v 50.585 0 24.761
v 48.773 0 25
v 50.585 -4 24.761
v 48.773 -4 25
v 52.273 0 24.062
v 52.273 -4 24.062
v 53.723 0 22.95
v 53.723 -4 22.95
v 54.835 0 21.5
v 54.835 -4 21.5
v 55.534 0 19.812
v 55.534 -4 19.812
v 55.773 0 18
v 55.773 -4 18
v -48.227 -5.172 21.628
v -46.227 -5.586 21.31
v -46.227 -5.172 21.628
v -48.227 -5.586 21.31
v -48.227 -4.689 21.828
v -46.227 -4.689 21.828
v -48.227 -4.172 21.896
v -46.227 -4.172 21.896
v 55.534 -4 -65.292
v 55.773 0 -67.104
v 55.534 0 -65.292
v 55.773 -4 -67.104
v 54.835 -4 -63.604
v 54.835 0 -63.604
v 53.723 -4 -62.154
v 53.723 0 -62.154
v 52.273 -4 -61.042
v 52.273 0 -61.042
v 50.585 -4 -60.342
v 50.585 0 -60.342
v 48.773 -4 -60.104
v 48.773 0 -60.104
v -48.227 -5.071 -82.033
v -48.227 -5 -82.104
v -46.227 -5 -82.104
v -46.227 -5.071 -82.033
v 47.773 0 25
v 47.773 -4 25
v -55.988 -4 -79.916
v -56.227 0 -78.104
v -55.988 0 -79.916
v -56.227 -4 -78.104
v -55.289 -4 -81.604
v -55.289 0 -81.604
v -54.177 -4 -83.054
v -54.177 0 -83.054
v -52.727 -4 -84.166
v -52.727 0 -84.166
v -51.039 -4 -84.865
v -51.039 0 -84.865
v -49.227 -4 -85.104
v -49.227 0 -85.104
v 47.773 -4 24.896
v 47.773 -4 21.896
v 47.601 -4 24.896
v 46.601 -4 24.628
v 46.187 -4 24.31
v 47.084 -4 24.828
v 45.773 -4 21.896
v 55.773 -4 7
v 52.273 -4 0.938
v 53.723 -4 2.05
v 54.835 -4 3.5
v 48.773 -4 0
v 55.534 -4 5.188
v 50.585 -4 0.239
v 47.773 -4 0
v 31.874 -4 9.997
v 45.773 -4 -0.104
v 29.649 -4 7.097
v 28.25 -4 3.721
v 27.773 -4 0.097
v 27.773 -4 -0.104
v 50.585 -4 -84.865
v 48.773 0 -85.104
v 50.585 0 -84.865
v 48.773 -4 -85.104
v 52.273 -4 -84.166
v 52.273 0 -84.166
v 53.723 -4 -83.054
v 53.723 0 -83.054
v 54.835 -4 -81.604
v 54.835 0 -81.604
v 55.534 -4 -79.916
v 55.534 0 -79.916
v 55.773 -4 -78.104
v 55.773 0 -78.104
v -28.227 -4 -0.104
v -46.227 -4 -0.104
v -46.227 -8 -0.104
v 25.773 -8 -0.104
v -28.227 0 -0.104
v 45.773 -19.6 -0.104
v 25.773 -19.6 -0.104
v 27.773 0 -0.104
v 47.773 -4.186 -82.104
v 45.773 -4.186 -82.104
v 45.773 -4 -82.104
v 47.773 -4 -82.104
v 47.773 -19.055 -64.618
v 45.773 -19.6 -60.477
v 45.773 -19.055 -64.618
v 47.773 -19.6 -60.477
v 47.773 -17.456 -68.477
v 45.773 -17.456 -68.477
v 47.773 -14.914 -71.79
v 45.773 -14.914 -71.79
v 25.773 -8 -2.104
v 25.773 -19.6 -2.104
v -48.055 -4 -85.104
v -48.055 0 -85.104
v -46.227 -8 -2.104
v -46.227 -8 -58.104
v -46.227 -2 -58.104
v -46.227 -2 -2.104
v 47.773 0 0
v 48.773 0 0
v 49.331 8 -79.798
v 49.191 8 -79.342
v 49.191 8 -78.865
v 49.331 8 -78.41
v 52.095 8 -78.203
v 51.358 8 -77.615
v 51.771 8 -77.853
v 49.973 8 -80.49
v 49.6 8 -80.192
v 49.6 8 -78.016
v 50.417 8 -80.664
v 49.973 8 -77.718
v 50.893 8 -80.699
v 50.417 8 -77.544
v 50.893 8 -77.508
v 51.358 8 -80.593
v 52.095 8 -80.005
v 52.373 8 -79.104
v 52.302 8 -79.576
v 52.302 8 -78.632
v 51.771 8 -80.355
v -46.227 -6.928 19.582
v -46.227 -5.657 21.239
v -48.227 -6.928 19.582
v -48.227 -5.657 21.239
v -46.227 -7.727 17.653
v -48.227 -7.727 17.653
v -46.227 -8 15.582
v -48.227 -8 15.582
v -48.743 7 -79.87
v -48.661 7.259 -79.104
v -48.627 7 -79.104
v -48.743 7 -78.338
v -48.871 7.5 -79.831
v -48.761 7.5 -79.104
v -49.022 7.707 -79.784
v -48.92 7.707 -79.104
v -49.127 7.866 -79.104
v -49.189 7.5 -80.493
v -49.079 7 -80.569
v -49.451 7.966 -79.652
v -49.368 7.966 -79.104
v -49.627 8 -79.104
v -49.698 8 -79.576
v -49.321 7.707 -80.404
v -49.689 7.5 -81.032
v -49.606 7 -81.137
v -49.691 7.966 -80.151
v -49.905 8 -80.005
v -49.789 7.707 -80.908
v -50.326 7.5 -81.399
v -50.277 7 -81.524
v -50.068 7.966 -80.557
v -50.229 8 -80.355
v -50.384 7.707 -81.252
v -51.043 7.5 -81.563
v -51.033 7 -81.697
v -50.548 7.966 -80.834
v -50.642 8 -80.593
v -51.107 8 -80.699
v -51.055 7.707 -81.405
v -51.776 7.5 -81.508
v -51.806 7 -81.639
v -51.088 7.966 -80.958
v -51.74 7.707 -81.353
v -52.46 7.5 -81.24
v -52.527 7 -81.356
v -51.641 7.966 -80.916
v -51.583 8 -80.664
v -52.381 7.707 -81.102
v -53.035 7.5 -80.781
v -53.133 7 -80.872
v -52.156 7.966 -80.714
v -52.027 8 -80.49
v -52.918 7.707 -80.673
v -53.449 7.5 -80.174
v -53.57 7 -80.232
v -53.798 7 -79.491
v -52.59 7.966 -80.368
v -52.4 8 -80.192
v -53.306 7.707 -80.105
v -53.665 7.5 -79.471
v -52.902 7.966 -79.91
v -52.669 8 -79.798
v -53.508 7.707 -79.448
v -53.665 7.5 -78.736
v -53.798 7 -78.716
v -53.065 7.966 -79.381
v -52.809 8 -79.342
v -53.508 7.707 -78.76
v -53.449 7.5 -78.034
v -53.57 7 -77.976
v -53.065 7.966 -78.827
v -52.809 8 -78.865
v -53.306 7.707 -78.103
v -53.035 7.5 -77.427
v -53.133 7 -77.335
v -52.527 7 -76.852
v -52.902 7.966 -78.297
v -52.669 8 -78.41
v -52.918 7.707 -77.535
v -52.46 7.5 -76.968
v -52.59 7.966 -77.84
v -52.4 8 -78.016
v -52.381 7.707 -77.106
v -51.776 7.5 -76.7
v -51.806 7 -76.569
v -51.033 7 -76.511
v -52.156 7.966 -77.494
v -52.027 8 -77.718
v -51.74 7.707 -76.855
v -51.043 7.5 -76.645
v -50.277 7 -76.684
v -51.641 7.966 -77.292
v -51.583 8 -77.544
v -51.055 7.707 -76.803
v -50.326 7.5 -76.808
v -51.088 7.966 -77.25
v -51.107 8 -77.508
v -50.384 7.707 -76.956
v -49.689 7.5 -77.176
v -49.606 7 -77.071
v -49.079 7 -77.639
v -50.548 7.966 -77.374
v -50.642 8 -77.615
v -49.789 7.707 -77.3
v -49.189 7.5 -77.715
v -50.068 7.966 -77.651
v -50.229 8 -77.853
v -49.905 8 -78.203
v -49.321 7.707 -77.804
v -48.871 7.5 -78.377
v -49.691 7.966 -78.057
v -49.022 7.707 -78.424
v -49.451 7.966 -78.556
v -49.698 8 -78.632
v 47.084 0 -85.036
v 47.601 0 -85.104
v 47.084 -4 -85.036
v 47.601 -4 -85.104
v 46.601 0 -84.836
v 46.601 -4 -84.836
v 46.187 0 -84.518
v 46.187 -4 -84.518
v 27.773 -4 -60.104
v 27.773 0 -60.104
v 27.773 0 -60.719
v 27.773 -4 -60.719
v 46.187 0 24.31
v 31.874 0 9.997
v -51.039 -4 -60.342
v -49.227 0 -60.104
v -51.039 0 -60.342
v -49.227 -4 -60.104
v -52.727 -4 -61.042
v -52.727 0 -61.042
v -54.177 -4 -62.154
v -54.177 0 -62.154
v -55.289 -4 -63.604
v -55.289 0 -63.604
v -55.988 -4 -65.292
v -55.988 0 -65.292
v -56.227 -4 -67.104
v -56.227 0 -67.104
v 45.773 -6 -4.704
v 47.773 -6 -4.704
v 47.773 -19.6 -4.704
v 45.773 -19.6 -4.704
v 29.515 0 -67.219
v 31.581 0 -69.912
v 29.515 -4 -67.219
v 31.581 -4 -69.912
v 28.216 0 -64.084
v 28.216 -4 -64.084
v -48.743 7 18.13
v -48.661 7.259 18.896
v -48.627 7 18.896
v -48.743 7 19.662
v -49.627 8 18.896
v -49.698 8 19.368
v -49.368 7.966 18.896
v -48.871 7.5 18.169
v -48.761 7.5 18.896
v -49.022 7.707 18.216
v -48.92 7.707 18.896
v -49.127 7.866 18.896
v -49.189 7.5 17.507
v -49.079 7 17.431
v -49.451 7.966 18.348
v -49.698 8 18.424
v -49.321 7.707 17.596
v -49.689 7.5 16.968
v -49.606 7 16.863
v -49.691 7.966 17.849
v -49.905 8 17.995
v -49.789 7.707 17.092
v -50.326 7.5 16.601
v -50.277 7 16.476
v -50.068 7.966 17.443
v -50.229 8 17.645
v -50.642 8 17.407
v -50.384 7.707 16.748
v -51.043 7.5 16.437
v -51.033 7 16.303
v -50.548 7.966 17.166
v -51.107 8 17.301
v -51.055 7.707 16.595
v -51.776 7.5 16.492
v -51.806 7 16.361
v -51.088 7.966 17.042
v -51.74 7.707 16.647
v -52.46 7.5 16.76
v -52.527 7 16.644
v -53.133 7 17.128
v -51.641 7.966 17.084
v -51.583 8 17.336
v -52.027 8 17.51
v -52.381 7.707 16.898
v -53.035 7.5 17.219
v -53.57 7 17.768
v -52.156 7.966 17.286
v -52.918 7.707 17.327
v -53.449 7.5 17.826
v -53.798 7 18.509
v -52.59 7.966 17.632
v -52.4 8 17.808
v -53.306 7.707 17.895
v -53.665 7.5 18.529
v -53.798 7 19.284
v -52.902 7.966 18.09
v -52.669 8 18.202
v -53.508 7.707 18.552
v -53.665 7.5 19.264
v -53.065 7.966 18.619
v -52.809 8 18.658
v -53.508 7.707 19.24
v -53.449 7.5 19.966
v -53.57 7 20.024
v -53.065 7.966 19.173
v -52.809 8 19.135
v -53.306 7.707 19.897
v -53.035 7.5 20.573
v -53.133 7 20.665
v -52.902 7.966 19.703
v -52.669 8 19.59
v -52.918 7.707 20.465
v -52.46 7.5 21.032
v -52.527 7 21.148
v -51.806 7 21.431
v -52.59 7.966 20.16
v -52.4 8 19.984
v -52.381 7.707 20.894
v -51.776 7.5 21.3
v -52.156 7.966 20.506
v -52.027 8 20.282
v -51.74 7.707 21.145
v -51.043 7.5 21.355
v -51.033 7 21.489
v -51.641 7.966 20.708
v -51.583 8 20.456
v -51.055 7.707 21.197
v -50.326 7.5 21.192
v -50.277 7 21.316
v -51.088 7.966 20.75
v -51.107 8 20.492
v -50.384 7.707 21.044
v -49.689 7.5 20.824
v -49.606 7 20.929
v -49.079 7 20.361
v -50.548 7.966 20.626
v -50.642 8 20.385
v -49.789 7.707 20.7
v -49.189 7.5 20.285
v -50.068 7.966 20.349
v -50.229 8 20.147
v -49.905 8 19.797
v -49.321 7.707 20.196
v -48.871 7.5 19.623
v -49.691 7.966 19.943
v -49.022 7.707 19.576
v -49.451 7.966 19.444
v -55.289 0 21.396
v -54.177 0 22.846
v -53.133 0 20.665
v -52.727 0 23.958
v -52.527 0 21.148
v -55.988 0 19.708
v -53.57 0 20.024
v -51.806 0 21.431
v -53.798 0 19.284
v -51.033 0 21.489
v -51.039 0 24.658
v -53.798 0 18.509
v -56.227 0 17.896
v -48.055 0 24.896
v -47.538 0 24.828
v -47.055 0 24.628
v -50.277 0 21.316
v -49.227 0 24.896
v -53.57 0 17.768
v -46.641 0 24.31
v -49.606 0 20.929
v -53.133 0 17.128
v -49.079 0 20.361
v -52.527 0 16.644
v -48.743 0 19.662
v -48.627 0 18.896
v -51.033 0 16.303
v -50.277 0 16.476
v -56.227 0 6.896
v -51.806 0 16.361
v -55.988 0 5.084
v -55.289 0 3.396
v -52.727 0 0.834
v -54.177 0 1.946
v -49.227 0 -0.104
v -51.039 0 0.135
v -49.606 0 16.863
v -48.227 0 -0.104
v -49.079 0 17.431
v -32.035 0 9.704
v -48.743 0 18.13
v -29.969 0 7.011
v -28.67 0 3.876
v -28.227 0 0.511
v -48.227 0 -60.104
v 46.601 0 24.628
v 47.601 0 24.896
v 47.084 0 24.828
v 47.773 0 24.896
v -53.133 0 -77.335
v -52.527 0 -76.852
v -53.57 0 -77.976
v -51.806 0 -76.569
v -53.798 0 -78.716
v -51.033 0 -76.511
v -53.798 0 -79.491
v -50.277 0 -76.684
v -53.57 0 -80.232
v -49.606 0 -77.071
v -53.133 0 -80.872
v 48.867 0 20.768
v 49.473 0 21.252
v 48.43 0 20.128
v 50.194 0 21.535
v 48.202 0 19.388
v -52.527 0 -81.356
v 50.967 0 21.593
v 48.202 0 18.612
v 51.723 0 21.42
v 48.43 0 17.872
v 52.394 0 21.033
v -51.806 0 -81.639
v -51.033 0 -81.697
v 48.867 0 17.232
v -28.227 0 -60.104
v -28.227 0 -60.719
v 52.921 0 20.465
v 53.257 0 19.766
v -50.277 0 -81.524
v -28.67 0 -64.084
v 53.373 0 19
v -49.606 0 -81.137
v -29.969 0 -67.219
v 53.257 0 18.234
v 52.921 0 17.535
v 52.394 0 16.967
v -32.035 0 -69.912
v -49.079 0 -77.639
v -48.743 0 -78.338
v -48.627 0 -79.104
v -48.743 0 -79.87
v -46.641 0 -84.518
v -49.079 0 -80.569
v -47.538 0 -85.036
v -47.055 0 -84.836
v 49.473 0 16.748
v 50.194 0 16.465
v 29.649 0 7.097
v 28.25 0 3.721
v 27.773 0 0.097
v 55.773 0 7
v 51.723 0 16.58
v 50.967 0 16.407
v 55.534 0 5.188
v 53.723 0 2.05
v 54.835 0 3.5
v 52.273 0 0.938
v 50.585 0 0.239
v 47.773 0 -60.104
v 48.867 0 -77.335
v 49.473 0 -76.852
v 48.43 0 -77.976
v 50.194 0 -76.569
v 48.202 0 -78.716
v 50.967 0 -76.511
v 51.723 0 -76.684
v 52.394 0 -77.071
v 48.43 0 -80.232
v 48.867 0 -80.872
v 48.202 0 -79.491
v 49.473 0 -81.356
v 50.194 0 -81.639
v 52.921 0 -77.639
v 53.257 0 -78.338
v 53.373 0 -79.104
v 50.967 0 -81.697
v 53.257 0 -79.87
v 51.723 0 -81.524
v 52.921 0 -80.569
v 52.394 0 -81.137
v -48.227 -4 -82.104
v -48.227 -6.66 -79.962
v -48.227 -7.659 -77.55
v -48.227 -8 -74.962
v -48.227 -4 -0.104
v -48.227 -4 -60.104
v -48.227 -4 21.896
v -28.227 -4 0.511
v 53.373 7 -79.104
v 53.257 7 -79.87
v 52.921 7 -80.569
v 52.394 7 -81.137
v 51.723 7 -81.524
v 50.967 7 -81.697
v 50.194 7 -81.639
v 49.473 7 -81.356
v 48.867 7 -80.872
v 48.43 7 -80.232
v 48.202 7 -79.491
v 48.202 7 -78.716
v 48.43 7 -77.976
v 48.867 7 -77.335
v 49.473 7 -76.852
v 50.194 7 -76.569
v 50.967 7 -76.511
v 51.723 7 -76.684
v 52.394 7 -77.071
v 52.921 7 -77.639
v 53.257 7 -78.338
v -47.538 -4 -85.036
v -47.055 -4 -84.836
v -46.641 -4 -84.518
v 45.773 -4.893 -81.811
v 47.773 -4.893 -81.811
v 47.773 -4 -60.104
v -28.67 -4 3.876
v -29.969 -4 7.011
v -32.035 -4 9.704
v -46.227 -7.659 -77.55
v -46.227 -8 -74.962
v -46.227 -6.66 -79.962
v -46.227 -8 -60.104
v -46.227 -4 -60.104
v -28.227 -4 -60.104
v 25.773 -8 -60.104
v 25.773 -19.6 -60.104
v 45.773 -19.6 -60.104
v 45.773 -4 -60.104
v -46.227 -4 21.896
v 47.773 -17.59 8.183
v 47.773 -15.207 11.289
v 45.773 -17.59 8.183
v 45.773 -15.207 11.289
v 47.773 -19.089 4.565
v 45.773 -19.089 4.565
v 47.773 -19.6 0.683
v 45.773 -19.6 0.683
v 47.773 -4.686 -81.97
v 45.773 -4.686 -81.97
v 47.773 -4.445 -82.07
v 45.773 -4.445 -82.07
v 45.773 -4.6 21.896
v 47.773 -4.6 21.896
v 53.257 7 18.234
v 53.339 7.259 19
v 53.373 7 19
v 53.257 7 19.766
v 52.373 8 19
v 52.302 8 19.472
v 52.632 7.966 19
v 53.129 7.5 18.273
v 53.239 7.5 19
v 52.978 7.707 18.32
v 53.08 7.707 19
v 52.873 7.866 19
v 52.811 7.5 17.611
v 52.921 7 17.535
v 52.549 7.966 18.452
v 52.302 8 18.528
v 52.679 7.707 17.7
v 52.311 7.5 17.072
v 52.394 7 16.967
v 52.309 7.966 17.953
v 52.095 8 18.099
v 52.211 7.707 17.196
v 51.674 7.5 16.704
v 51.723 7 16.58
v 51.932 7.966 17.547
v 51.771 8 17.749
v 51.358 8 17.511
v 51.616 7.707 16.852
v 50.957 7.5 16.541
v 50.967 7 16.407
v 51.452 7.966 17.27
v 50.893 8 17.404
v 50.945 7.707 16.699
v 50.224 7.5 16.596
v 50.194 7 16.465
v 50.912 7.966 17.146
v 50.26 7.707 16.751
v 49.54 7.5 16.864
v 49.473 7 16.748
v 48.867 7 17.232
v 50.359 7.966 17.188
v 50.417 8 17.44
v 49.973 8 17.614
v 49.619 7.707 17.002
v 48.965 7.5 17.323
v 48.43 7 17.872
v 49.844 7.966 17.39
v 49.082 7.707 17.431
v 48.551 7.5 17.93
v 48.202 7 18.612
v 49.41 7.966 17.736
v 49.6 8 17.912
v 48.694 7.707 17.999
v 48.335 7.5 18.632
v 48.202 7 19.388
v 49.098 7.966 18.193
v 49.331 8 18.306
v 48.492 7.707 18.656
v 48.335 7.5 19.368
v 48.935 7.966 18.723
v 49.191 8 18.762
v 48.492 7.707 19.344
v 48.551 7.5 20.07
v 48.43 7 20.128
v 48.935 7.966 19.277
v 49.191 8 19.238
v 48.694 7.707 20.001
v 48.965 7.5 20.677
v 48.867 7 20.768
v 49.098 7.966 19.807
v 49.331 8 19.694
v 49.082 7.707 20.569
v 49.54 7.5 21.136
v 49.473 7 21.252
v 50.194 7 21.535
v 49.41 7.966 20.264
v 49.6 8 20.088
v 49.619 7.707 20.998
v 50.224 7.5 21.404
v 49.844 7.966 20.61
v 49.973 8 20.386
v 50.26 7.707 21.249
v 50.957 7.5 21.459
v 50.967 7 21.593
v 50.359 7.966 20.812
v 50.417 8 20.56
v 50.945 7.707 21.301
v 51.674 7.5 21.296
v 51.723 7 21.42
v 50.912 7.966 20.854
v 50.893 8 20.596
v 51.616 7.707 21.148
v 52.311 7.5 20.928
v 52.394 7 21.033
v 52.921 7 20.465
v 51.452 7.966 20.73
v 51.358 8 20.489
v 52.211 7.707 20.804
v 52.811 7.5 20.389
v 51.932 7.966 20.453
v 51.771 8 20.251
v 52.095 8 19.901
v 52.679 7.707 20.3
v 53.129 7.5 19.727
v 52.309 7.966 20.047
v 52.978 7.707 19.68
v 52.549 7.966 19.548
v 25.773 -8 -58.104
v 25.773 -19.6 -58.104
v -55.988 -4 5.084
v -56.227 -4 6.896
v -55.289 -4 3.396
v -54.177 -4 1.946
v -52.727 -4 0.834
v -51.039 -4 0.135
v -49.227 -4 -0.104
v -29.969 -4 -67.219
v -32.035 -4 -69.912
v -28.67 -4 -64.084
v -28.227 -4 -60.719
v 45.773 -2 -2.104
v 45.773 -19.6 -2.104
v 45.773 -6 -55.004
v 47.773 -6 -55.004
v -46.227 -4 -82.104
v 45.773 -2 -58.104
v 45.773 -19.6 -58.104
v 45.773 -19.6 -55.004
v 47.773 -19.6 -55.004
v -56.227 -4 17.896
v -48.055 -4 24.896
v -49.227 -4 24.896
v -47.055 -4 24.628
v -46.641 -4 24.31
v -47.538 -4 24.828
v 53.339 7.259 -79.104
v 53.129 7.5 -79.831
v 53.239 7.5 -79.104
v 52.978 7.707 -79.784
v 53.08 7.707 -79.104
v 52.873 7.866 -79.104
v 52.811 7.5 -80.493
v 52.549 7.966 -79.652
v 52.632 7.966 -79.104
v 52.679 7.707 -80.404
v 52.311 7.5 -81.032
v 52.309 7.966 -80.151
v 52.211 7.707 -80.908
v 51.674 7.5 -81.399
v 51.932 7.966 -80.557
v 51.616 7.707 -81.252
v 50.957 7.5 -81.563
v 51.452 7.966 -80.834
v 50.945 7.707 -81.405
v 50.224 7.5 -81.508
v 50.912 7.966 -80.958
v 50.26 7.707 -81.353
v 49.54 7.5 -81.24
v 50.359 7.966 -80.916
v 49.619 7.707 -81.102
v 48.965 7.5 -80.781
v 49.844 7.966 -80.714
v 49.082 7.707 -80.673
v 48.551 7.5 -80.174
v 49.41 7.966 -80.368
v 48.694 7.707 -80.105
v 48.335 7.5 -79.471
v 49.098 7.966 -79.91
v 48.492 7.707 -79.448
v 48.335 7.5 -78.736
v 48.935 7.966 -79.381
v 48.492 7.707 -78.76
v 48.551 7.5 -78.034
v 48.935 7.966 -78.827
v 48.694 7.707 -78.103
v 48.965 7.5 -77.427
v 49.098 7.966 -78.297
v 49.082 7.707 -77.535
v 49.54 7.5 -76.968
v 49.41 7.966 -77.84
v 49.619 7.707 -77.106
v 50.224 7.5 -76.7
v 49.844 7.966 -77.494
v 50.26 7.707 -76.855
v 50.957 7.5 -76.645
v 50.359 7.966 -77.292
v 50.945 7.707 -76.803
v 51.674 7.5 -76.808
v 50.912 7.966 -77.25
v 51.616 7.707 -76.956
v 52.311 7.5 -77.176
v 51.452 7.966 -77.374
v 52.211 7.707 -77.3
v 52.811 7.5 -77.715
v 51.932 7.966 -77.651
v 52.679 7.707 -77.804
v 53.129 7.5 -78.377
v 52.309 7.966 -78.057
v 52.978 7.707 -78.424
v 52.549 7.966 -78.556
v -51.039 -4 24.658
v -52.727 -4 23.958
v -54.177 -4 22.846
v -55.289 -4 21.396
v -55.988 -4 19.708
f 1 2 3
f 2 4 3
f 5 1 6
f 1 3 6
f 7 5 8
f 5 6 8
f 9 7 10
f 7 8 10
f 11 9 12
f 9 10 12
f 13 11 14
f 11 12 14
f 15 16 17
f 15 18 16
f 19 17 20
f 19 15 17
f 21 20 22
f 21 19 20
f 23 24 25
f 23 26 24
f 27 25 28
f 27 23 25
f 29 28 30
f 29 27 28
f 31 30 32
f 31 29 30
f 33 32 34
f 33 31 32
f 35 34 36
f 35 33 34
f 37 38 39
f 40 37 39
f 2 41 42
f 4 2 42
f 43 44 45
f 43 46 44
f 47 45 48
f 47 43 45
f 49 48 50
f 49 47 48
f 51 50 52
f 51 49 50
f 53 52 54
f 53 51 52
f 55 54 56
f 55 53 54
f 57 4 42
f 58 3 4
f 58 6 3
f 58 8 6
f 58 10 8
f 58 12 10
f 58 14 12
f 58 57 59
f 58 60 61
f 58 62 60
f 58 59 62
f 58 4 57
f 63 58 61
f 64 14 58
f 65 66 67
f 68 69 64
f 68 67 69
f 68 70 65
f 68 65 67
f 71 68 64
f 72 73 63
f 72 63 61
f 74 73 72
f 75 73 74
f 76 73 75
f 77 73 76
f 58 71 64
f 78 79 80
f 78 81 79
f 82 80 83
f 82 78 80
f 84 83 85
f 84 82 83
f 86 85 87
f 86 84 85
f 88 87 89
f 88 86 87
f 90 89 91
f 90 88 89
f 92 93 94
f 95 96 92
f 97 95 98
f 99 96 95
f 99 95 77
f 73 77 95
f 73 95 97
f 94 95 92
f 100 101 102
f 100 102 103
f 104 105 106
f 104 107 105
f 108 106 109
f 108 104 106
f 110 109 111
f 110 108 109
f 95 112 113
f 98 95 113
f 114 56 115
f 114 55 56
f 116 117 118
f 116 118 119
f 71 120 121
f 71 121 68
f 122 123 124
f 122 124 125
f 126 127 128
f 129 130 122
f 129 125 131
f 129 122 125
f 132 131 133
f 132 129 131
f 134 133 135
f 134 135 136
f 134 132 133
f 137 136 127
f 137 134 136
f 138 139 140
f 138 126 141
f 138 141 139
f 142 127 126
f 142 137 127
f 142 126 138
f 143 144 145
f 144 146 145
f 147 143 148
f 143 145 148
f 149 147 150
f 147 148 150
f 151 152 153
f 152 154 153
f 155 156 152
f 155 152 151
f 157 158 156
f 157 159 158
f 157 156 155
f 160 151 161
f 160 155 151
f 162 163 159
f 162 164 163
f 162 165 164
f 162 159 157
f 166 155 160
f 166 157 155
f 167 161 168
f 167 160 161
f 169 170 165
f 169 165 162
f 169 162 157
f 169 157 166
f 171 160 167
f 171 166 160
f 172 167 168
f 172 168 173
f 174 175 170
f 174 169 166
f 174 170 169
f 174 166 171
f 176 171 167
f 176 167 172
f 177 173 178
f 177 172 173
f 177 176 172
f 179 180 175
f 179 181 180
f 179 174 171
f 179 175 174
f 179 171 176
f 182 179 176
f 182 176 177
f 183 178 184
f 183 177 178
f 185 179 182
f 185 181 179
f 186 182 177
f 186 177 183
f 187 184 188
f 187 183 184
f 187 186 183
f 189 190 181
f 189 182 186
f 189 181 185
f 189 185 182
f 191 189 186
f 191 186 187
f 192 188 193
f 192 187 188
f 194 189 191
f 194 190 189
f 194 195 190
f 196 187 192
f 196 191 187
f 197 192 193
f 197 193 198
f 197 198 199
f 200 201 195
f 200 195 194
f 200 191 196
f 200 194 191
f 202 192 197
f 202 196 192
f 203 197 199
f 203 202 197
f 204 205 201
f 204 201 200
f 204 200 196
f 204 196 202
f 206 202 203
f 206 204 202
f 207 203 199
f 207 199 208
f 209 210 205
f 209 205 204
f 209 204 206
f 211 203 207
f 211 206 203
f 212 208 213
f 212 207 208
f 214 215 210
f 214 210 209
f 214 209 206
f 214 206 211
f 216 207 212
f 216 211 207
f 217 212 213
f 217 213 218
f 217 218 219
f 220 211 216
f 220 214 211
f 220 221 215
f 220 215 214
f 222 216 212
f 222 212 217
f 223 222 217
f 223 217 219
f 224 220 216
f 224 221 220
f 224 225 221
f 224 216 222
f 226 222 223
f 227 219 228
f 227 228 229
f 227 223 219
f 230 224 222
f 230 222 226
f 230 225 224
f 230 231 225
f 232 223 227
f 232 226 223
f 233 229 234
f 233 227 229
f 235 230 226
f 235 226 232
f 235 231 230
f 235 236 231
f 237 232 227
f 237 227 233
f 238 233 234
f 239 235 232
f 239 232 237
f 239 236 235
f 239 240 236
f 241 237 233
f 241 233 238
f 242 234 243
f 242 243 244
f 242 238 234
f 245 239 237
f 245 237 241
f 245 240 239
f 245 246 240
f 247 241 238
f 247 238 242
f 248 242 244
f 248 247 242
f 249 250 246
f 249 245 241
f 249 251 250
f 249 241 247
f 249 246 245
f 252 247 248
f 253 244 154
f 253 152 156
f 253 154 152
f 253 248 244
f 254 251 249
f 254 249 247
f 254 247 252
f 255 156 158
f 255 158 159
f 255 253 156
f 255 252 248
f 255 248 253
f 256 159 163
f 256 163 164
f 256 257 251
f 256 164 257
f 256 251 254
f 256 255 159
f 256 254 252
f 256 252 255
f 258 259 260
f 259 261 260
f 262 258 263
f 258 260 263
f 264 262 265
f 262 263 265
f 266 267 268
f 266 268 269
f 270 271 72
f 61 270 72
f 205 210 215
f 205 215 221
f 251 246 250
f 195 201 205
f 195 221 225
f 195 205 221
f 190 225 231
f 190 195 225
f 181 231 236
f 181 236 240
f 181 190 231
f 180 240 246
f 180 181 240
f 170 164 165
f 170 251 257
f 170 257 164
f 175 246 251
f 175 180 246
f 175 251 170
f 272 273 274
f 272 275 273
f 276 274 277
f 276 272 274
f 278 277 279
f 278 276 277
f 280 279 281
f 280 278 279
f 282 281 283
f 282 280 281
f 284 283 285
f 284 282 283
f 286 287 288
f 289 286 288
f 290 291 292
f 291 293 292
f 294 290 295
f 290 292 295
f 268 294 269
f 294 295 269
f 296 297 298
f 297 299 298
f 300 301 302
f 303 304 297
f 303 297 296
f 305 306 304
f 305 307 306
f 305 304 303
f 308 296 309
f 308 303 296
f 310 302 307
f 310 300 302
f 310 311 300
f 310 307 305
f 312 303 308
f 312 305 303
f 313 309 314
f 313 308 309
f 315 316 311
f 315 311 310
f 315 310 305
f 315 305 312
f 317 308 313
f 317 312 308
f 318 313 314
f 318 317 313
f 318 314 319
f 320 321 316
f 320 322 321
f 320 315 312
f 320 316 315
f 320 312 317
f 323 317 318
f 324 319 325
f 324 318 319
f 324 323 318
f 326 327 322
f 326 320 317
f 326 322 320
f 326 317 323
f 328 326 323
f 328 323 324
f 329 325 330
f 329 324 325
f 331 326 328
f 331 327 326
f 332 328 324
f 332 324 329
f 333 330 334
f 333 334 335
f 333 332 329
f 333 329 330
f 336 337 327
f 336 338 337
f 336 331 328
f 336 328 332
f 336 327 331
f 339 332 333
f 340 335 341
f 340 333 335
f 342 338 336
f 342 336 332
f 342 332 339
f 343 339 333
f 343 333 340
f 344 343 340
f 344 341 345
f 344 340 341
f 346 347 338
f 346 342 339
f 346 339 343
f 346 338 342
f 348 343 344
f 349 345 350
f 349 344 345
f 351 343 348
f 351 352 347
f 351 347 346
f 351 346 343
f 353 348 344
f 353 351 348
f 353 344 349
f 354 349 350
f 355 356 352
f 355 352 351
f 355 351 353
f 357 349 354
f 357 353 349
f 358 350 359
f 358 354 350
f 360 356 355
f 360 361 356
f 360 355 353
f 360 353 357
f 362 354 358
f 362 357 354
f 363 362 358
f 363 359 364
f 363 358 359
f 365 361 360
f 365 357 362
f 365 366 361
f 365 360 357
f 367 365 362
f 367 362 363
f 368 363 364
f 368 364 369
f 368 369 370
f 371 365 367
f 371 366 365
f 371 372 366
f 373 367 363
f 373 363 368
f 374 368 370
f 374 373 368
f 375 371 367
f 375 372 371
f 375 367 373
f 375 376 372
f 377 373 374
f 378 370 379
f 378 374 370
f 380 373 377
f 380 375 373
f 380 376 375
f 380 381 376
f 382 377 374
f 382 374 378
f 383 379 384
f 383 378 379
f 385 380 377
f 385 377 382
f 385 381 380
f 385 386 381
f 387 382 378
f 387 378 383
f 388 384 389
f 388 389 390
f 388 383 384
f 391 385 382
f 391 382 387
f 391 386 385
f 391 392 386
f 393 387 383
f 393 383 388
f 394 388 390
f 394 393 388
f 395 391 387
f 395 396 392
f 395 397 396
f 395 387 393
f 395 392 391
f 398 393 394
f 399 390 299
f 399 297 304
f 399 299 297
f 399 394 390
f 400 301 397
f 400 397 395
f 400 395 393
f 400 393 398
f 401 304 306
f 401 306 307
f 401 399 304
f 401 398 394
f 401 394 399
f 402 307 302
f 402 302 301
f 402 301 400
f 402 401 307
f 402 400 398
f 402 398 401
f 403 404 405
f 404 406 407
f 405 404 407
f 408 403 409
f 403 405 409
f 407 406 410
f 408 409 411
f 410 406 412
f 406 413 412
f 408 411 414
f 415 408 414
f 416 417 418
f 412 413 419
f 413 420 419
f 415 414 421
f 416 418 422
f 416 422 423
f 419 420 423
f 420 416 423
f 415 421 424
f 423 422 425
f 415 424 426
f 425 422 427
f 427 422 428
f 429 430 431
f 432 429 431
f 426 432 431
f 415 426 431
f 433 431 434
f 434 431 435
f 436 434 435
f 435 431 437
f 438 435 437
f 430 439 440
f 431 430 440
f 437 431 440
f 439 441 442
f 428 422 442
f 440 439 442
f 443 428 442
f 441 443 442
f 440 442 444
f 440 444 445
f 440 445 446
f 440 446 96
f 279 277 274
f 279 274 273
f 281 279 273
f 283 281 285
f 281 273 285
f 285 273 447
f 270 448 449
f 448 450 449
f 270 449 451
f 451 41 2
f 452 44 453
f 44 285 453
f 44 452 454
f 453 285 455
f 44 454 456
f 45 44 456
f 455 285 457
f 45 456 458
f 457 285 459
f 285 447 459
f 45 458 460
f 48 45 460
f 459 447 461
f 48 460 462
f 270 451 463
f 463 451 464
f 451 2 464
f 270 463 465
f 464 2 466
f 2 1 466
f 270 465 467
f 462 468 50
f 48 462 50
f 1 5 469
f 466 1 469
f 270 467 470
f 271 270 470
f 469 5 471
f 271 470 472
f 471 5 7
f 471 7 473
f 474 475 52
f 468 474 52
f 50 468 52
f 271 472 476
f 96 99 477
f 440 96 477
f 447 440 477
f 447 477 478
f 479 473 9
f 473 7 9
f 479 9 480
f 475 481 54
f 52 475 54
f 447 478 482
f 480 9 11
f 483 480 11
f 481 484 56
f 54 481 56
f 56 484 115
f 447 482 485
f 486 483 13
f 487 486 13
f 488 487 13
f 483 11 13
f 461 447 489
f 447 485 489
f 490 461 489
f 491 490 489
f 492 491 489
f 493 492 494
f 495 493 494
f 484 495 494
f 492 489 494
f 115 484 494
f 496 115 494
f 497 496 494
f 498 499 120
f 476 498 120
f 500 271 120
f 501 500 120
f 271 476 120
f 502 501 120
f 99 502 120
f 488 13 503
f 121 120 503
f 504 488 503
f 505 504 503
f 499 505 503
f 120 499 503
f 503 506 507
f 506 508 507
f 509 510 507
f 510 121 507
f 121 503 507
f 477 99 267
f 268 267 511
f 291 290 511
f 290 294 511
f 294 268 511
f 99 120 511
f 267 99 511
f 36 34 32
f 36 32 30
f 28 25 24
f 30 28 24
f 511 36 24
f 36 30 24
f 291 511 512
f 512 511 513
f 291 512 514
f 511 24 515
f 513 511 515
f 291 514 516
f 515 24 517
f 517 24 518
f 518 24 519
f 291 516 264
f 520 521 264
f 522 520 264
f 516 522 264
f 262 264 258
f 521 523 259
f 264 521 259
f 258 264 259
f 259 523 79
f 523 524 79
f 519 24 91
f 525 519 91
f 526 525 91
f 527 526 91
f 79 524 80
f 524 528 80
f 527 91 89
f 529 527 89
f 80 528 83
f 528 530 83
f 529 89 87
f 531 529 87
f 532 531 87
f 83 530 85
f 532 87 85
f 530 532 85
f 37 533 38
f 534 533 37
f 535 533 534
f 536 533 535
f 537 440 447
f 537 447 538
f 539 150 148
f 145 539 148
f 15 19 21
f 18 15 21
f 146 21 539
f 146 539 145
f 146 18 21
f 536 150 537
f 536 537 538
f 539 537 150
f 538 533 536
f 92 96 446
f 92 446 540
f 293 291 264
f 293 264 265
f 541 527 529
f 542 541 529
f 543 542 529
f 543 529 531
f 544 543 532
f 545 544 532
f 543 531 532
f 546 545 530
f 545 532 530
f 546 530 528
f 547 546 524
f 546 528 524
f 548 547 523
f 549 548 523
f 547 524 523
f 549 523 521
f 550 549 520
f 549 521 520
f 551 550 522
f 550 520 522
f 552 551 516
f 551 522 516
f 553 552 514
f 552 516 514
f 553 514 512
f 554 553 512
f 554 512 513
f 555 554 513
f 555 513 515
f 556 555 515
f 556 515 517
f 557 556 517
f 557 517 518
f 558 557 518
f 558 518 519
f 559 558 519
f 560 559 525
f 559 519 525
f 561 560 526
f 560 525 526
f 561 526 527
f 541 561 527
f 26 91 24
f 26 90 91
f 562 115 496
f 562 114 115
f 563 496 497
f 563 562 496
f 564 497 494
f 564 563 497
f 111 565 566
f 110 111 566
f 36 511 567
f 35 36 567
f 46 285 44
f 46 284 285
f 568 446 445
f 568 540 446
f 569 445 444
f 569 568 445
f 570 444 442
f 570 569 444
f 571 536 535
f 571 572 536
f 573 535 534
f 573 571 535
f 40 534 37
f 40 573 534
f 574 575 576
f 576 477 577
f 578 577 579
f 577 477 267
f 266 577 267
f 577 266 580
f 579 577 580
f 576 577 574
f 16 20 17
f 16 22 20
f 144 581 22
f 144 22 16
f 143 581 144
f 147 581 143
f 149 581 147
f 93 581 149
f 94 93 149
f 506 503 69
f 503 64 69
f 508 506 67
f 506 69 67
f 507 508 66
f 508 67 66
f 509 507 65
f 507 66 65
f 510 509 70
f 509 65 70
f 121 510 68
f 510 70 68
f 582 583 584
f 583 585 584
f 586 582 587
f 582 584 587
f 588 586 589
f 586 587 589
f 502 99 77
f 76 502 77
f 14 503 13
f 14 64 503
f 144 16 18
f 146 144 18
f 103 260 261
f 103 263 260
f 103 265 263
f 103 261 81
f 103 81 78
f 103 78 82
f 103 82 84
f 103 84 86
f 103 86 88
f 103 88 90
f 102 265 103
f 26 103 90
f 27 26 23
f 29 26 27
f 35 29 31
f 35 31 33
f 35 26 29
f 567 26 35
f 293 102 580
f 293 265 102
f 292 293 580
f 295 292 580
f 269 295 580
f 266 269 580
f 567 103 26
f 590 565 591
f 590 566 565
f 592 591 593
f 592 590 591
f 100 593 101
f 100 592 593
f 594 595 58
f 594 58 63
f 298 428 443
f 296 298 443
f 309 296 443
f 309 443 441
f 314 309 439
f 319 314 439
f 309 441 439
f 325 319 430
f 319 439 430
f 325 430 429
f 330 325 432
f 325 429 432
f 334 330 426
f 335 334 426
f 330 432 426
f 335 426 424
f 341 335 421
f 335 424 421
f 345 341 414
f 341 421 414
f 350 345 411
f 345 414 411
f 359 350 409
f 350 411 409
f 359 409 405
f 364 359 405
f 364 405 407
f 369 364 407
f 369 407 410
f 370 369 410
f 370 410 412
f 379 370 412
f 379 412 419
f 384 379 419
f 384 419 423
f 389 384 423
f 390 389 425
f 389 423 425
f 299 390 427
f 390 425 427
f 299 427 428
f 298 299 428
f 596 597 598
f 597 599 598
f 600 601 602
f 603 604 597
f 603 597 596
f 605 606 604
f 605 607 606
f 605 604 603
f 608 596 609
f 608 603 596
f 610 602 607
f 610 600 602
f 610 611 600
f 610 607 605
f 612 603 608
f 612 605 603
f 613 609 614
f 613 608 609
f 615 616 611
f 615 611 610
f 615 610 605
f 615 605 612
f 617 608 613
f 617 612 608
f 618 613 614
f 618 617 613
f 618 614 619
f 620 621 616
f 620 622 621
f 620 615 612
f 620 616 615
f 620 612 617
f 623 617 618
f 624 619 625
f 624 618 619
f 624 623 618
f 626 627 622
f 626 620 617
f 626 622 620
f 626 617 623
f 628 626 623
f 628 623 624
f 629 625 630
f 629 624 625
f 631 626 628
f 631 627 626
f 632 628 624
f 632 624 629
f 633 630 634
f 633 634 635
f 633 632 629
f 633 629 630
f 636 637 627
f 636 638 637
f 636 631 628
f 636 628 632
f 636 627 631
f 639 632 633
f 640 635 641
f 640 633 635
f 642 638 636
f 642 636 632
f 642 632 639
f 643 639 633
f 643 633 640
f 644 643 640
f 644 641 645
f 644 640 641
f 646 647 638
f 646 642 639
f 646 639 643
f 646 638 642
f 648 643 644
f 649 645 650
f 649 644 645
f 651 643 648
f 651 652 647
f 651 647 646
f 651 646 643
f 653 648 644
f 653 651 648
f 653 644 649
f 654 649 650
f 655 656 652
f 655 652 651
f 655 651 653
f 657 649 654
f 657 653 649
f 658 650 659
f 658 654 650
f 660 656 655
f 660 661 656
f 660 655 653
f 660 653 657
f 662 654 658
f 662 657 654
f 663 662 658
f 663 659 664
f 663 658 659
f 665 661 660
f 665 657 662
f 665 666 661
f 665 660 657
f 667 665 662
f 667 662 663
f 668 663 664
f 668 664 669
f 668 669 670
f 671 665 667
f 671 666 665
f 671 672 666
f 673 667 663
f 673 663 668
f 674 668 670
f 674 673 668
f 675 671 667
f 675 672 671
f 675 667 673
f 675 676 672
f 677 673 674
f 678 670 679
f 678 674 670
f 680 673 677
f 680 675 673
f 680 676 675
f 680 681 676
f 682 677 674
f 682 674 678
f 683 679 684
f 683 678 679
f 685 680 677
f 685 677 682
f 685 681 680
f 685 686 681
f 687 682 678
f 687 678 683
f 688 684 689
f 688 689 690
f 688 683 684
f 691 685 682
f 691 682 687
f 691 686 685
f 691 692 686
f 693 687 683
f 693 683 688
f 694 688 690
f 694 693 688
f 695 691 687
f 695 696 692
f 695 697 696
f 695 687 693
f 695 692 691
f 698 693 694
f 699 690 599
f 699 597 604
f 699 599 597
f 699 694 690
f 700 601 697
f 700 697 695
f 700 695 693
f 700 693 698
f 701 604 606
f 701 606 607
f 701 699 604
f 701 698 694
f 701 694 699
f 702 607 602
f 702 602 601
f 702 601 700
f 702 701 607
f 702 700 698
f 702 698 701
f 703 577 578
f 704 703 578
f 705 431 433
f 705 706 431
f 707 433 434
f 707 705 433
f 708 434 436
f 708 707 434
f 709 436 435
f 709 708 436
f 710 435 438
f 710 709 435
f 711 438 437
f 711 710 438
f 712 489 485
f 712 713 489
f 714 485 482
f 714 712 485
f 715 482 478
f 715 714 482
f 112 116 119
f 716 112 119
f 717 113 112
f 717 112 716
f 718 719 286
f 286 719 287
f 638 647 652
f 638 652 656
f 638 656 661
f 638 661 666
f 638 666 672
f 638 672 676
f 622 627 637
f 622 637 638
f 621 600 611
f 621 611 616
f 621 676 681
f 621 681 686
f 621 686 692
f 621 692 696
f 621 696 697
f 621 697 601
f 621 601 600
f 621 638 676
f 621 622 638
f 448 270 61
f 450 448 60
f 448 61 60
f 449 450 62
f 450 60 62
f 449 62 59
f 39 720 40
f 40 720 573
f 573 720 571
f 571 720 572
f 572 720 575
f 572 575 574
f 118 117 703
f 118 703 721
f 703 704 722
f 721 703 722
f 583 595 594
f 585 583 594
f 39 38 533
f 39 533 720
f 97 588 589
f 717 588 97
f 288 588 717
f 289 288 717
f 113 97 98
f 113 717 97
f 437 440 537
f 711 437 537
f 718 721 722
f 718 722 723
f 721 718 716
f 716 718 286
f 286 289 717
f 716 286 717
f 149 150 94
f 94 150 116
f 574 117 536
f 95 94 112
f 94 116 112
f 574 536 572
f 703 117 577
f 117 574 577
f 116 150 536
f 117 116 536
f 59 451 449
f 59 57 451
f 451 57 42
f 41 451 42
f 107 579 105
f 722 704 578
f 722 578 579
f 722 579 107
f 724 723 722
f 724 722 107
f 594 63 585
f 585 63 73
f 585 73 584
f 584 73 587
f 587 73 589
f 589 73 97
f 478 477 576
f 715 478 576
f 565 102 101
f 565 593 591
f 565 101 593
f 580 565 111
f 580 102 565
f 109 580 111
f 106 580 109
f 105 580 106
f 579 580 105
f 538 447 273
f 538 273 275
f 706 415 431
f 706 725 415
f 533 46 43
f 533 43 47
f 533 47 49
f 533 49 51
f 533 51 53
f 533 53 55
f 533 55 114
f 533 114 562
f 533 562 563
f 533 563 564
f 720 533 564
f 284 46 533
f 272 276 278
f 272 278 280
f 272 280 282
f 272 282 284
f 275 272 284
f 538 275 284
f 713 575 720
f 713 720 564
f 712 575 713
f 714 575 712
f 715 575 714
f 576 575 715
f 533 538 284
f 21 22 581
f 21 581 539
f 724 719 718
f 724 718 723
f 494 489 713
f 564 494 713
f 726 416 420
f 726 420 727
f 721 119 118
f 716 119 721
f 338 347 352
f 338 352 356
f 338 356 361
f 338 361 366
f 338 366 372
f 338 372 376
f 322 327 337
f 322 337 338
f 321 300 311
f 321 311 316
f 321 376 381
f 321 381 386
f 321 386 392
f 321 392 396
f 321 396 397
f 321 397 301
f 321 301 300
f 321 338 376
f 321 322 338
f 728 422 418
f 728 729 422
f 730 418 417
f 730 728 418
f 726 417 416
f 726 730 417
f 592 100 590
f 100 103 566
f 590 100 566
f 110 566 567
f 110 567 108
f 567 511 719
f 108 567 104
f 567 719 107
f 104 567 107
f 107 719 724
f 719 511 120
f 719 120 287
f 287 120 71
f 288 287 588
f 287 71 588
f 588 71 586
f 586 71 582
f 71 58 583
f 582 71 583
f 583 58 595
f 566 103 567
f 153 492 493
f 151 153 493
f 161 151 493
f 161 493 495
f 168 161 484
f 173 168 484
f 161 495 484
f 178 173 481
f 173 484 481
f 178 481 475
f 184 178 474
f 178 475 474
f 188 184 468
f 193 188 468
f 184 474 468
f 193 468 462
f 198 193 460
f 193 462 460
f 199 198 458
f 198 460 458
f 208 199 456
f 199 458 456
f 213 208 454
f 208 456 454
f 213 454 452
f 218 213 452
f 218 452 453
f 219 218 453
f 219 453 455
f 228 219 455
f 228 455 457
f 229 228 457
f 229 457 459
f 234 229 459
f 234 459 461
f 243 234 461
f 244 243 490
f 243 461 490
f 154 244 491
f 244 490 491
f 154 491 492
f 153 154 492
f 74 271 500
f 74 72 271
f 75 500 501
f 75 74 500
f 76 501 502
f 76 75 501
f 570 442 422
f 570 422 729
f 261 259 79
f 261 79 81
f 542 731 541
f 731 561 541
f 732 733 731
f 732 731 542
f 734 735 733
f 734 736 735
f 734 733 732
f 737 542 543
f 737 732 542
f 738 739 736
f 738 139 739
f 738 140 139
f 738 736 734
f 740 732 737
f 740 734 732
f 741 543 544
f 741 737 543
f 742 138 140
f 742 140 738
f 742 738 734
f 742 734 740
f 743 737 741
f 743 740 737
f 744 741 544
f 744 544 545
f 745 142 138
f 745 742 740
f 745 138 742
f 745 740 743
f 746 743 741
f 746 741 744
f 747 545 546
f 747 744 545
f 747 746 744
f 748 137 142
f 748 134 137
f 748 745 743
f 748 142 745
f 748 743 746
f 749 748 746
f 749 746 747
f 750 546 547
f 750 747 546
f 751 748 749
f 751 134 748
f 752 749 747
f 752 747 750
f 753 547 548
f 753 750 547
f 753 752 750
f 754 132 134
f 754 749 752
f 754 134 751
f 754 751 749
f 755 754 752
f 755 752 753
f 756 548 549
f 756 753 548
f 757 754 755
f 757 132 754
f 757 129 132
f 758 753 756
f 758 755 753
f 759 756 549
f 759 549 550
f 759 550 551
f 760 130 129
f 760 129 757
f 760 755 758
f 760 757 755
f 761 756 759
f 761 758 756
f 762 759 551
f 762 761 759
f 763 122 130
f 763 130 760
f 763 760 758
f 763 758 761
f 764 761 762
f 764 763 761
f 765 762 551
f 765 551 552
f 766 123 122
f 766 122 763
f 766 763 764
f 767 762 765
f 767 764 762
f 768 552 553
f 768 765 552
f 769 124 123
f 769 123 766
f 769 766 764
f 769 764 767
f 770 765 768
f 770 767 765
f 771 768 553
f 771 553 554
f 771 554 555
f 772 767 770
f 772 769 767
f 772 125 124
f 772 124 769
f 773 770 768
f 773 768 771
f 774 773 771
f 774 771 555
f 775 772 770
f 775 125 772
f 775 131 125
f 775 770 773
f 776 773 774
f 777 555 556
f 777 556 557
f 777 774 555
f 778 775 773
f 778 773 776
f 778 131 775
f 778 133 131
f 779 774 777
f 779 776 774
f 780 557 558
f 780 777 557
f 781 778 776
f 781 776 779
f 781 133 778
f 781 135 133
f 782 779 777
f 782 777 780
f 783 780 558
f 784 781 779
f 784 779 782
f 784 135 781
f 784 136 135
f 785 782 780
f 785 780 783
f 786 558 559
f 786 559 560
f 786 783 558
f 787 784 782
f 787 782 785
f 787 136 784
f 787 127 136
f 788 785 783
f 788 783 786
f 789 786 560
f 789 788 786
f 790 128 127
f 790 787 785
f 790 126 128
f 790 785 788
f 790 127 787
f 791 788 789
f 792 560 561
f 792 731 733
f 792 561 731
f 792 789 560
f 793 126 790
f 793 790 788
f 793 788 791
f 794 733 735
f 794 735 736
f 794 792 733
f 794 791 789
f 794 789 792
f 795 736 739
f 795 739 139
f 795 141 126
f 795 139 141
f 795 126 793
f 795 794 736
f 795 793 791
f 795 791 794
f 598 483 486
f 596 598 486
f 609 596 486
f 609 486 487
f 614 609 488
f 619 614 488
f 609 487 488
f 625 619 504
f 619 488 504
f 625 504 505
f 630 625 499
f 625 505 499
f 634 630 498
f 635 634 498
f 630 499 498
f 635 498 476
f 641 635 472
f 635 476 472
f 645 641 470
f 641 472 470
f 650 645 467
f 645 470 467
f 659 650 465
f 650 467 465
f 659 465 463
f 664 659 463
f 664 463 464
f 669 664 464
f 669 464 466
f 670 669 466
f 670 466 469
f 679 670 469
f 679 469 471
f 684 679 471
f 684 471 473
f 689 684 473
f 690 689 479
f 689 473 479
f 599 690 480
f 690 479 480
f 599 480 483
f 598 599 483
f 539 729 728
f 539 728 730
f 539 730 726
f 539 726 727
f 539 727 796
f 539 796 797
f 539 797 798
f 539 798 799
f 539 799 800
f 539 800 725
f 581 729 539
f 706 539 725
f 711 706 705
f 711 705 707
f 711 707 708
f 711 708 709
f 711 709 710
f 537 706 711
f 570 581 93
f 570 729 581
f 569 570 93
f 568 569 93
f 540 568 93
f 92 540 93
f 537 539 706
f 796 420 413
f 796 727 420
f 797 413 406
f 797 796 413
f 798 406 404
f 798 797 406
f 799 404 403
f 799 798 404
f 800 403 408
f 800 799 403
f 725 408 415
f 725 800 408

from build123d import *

# Parameters (mm, degrees)
SKETCH_W        = 96
SKETCH_H        = 60
PAD_DEPTH       = 30
SKETCH001_W     = 92
SKETCH001_H     = 56
POCKET_DEPTH    = 28
SKETCH002_W     = 74
SKETCH002_H     = 22
POCKET001_DEPTH = 60
SKETCH003_W     = 22
SKETCH003_H     = 4
POCKET002_DEPTH = 60
SKETCH005_W     = 22
SKETCH005_H     = 6.4
POCKET003_DEPTH = 60
SKETCH004_W     = 50.3
SKETCH004_H     = 13.6
POCKET004_DEPTH = 5
SKETCH006_W     = 20
SKETCH006_H     = 4
PAD001_DEPTH    = 25
SKETCH007_W     = 20
SKETCH007_H     = 4
PAD002_DEPTH    = 25
SKETCH008_W     = 25
SKETCH008_H     = 4
PAD003_DEPTH    = 8
SKETCH009_W     = 25
SKETCH009_H     = 4
PAD004_DEPTH    = 8
SKETCH010_R     = 2.6
PAD005_DEPTH    = 8
FILLET_R        = 1
FILLET001_R     = 1
FILLET002_R     = 1
FILLET003_R     = 1
CHAMFER_SIZE    = 19
FILLET004_R     = 7
FILLET005_R     = 2
FILLET006_R     = 13
FILLET007_R     = 7
CHAMFER001_SIZE = 19
FILLET008_R     = 14
FILLET009_R     = 2
FILLET010_R     = 7
FILLET011_R     = 7
CHAMFER002_SIZE = 19
FILLET012_R     = 13
FILLET013_R     = 2
FILLET014_R     = 7
FILLET015_R     = 7
FILLET016_R     = 7
FILLET017_R     = 7
CHAMFER003_SIZE = 19
FILLET018_R     = 2
FILLET019_R     = 13
SKETCH011_W     = 2
SKETCH011_H     = 15.6
SKETCH011_H_2   = 4
PAD006_DEPTH    = 22
CHAMFER004_SIZE = 15
FILLET020_R     = 15
CHAMFER005_SIZE = 3
FILLET021_R     = 2
FILLET022_R     = 8
SKETCH012_W     = 2
SKETCH012_H     = 15.6
SKETCH012_H_2   = 4
PAD007_DEPTH    = 22
CHAMFER006_SIZE = 15
FILLET023_R     = 16
FILLET024_R     = 1
CHAMFER007_SIZE = 3
FILLET025_R     = 10


with BuildPart() as part:
    # Sketch → Pad (new body)
    with BuildSketch(Plane.XZ):
        with Locations((-0.226995, -30.10394)):
            Rectangle(SKETCH_W, SKETCH_H)
    extrude(amount=PAD_DEPTH)

    # Sketch001 (on Face6 of Pad) → Pocket (cut)
    with BuildSketch(Plane.XZ.offset(30)):
        with Locations((-0.226995, -30.10394)):
            Rectangle(SKETCH001_W, SKETCH001_H)
    extrude(amount=-POCKET_DEPTH, mode=Mode.SUBTRACT)

    # Sketch002 (on Face6 of Pocket) → Pocket001 (cut)
    with BuildSketch(Plane(origin=(0, 0, -60.10394), x_dir=(1, 0, 0), z_dir=(0, 0, -1))):
        with Locations((-11.226995, 19)):
            Rectangle(SKETCH002_W, SKETCH002_H)
    extrude(amount=-POCKET001_DEPTH, mode=Mode.SUBTRACT)

    # Sketch003 (on Face8 of Pocket001) → Pocket002 (cut)
    with BuildSketch(Plane(origin=(0, 0, -60.10394), x_dir=(1, 0, 0), z_dir=(0, 0, -1))):
        with Locations((36.773005, 28)):
            Rectangle(SKETCH003_W, SKETCH003_H)
    extrude(amount=-POCKET002_DEPTH, mode=Mode.SUBTRACT)

    # Sketch005 (on Face8 of Pocket002) → Pocket003 (cut)
    with BuildSketch(Plane(origin=(0, 0, -60.10394), x_dir=(1, 0, 0), z_dir=(0, 0, -1))):
        with Locations((36.773005, 22.8)):
            Rectangle(SKETCH005_W, SKETCH005_H)
    extrude(amount=-POCKET003_DEPTH, mode=Mode.SUBTRACT)

    # Sketch004 (on Face3 of Pocket002) → Pocket004 (cut)
    with BuildSketch(Plane(origin=(47.773005, 0, 0), x_dir=(0, 0, 1), z_dir=(1, 0, 0))):
        with Locations((-29.85394, 12.8)):
            Rectangle(SKETCH004_W, SKETCH004_H)
    extrude(amount=-POCKET004_DEPTH, mode=Mode.SUBTRACT)

    # Sketch006 (on Face1 of Pocket004) → Pad001 (join)
    with BuildSketch(Plane(origin=(0, 0, -0.10394), x_dir=(-1, 0, 0), z_dir=(0, 0, 1))):
        with Locations((-37.773005, 2)):
            Rectangle(SKETCH006_W, SKETCH006_H)
        with Locations((38.226995, 2)):
            Rectangle(SKETCH006_W, SKETCH006_H)
    extrude(amount=PAD001_DEPTH)

    # Sketch007 (on Face14 of Pad001) → Pad002 (join)
    with BuildSketch(Plane(origin=(0, 0, -60.10394), x_dir=(1, 0, 0), z_dir=(0, 0, -1))):
        with Locations((-38.226995, 2)):
            Rectangle(SKETCH007_W, SKETCH007_H)
        with Locations((37.773005, 2)):
            Rectangle(SKETCH007_W, SKETCH007_H)
    extrude(amount=PAD002_DEPTH)

    # Sketch008 (on Face19 of Pad002) → Pad003 (join)
    with BuildSketch(Plane(origin=(47.773005, 0, 0), x_dir=(0, 0, 1), z_dir=(1, 0, 0))):
        with Locations((-72.60394, 2)):
            Rectangle(SKETCH008_W, SKETCH008_H)
        with Locations((12.5, 2)):
            Rectangle(SKETCH008_W, SKETCH008_H)
    extrude(amount=PAD003_DEPTH)

    # Sketch009 (on Face31 of Pad003) → Pad004 (join)
    with BuildSketch(Plane(origin=(-48.226995, 0, 0), x_dir=(0, 0, -1), z_dir=(-1, 0, 0))):
        with Locations((-12.39606, 2)):
            Rectangle(SKETCH009_W, SKETCH009_H)
        with Locations((72.60394, 2)):
            Rectangle(SKETCH009_W, SKETCH009_H)
    extrude(amount=PAD004_DEPTH)

    # Sketch010 (on Face2 of Pad004) → Pad005 (join)
    with BuildSketch(Plane(origin=(0, 0, 0), x_dir=(1, 0, 0), z_dir=(0, 1, 0))):
        with Locations((50.773005, 79.10394)):
            Circle(SKETCH010_R)
        with Locations((50.773005, -19)):
            Circle(SKETCH010_R)
        with Locations((-51.226995, -18.89606)):
            Circle(SKETCH010_R)
        with Locations((-51.226995, 79.10394)):
            Circle(SKETCH010_R)
    extrude(amount=PAD005_DEPTH)

    # Fillet
    fillet_edges = [part.edges().sort_by_distance(p)[0] for p in [
        (48.173005, 8, 19),
    ]]
    fillet(fillet_edges, radius=FILLET_R)

    # Fillet001
    fillet001_edges = [part.edges().sort_by_distance(p)[0] for p in [
        (48.173005, 8, -79.10394),
    ]]
    fillet(fillet001_edges, radius=FILLET001_R)

    # Fillet002
    fillet002_edges = [part.edges().sort_by_distance(p)[0] for p in [
        (-53.826995, 8, -79.10394),
    ]]
    fillet(fillet002_edges, radius=FILLET002_R)

    # Fillet003
    fillet003_edges = [part.edges().sort_by_distance(p)[0] for p in [
        (-53.826995, 8, 18.89606),
    ]]
    fillet(fillet003_edges, radius=FILLET003_R)

    # Chamfer
    chamfer_edges = [part.edges().sort_by_distance(p)[0] for p in [
        (27.773005, -2, -85.10394),
    ]]
    chamfer(chamfer_edges, length=CHAMFER_SIZE)

    # Fillet004
    fillet004_edges = [part.edges().sort_by_distance(p)[0] for p in [
        (55.773005, -2, -85.10394),
    ]]
    fillet(fillet004_edges, radius=FILLET004_R)

    # Fillet005
    fillet005_edges = [part.edges().sort_by_distance(p)[0] for p in [
        (46.773005, -2, -85.10394),
    ]]
    fillet(fillet005_edges, radius=FILLET005_R)

    # Fillet006
    fillet006_edges = [part.edges().sort_by_distance(p)[0] for p in [
        (27.773005, -2, -66.10394),
    ]]
    fillet(fillet006_edges, radius=FILLET006_R)

    # Fillet007
    fillet007_edges = [part.edges().sort_by_distance(p)[0] for p in [
        (55.773005, -2, -60.10394),
    ]]
    fillet(fillet007_edges, radius=FILLET007_R)

    # Chamfer001
    chamfer001_edges = [part.edges().sort_by_distance(p)[0] for p in [
        (27.773005, -2, 24.89606),
    ]]
    chamfer(chamfer001_edges, length=CHAMFER001_SIZE)

    # Fillet008
    fillet008_edges = [part.edges().sort_by_distance(p)[0] for p in [
        (27.773005, -2, 5.89606),
    ]]
    fillet(fillet008_edges, radius=FILLET008_R)

    # Fillet009
    fillet009_edges = [part.edges().sort_by_distance(p)[0] for p in [
        (46.773005, -2, 24.89606),
    ]]
    fillet(fillet009_edges, radius=FILLET009_R)

    # Fillet010
    fillet010_edges = [part.edges().sort_by_distance(p)[0] for p in [
        (55.773005, -2, 25),
    ]]
    fillet(fillet010_edges, radius=FILLET010_R)

    # Fillet011
    fillet011_edges = [part.edges().sort_by_distance(p)[0] for p in [
        (55.773005, -2, 0),
    ]]
    fillet(fillet011_edges, radius=FILLET011_R)

    # Chamfer002
    chamfer002_edges = [part.edges().sort_by_distance(p)[0] for p in [
        (-28.226995, -2, 24.89606),
    ]]
    chamfer(chamfer002_edges, length=CHAMFER002_SIZE)

    # Fillet012
    fillet012_edges = [part.edges().sort_by_distance(p)[0] for p in [
        (-28.226995, -2, 5.89606),
    ]]
    fillet(fillet012_edges, radius=FILLET012_R)

    # Fillet013
    fillet013_edges = [part.edges().sort_by_distance(p)[0] for p in [
        (-47.226995, -2, 24.89606),
    ]]
    fillet(fillet013_edges, radius=FILLET013_R)

    # Fillet014
    fillet014_edges = [part.edges().sort_by_distance(p)[0] for p in [
        (-56.226995, -2, 24.89606),
    ]]
    fillet(fillet014_edges, radius=FILLET014_R)

    # Fillet015
    fillet015_edges = [part.edges().sort_by_distance(p)[0] for p in [
        (-56.226995, -2, -0.10394),
    ]]
    fillet(fillet015_edges, radius=FILLET015_R)

    # Fillet016
    fillet016_edges = [part.edges().sort_by_distance(p)[0] for p in [
        (-56.226995, -2, -60.10394),
    ]]
    fillet(fillet016_edges, radius=FILLET016_R)

    # Fillet017
    fillet017_edges = [part.edges().sort_by_distance(p)[0] for p in [
        (-56.226995, -2, -85.10394),
    ]]
    fillet(fillet017_edges, radius=FILLET017_R)

    # Chamfer003
    chamfer003_edges = [part.edges().sort_by_distance(p)[0] for p in [
        (-28.226995, -2, -85.10394),
    ]]
    chamfer(chamfer003_edges, length=CHAMFER003_SIZE)

    # Fillet018
    fillet018_edges = [part.edges().sort_by_distance(p)[0] for p in [
        (-47.226995, -2, -85.10394),
    ]]
    fillet(fillet018_edges, radius=FILLET018_R)

    # Fillet019
    fillet019_edges = [part.edges().sort_by_distance(p)[0] for p in [
        (-28.226995, -2, -66.10394),
    ]]
    fillet(fillet019_edges, radius=FILLET019_R)

    # Sketch011 (on Face13 of Fillet019) → Pad006 (join)
    with BuildSketch(Plane(origin=(0, 0, -0.10394), x_dir=(-1, 0, 0), z_dir=(0, 0, 1))):
        with Locations((-46.773005, 11.8)):
            Rectangle(SKETCH011_W, SKETCH011_H)
        with Locations((47.226995, 6)):
            Rectangle(SKETCH011_W, SKETCH011_H_2)
    extrude(amount=PAD006_DEPTH)

    # Chamfer004
    chamfer004_edges = [part.edges().sort_by_distance(p)[0] for p in [
        (46.773005, -19.6, 21.89606),
    ]]
    chamfer(chamfer004_edges, length=CHAMFER004_SIZE)

    # Fillet020
    fillet020_edges = [part.edges().sort_by_distance(p)[0] for p in [
        (46.773005, -19.6, 6.89606),
    ]]
    fillet(fillet020_edges, radius=FILLET020_R)

    # Chamfer005
    chamfer005_edges = [part.edges().sort_by_distance(p)[0] for p in [
        (-47.226995, -8, 21.89606),
    ]]
    chamfer(chamfer005_edges, length=CHAMFER005_SIZE)

    # Fillet021
    fillet021_edges = [part.edges().sort_by_distance(p)[0] for p in [
        (-47.226995, -5, 21.89606),
    ]]
    fillet(fillet021_edges, radius=FILLET021_R)

    # Fillet022
    fillet022_edges = [part.edges().sort_by_distance(p)[0] for p in [
        (-47.226995, -8, 18.89606),
    ]]
    fillet(fillet022_edges, radius=FILLET022_R)

    # Sketch012 (on Face24 of Fillet022) → Pad007 (join)
    with BuildSketch(Plane(origin=(0, 0, -60.10394), x_dir=(1, 0, 0), z_dir=(0, 0, -1))):
        with Locations((46.773005, 11.8)):
            Rectangle(SKETCH012_W, SKETCH012_H)
        with Locations((-47.226995, 6)):
            Rectangle(SKETCH012_W, SKETCH012_H_2)
    extrude(amount=PAD007_DEPTH)

    # Chamfer006
    chamfer006_edges = [part.edges().sort_by_distance(p)[0] for p in [
        (46.773005, -19.6, -82.10394),
    ]]
    chamfer(chamfer006_edges, length=CHAMFER006_SIZE)

    # Fillet023
    fillet023_edges = [part.edges().sort_by_distance(p)[0] for p in [
        (46.773005, -19.6, -67.10394),
    ]]
    fillet(fillet023_edges, radius=FILLET023_R)

    # Fillet024
    fillet024_edges = [part.edges().sort_by_distance(p)[0] for p in [
        (46.773005, -4.6, -82.10394),
    ]]
    fillet(fillet024_edges, radius=FILLET024_R)

    # Chamfer007
    chamfer007_edges = [part.edges().sort_by_distance(p)[0] for p in [
        (-47.226995, -8, -82.10394),
    ]]
    chamfer(chamfer007_edges, length=CHAMFER007_SIZE)

    # Fillet025
    fillet025_edges = [part.edges().sort_by_distance(p)[0] for p in [
        (-47.226995, -8, -79.10394),
    ]]
    fillet(fillet025_edges, radius=FILLET025_R)


solid = part.part
